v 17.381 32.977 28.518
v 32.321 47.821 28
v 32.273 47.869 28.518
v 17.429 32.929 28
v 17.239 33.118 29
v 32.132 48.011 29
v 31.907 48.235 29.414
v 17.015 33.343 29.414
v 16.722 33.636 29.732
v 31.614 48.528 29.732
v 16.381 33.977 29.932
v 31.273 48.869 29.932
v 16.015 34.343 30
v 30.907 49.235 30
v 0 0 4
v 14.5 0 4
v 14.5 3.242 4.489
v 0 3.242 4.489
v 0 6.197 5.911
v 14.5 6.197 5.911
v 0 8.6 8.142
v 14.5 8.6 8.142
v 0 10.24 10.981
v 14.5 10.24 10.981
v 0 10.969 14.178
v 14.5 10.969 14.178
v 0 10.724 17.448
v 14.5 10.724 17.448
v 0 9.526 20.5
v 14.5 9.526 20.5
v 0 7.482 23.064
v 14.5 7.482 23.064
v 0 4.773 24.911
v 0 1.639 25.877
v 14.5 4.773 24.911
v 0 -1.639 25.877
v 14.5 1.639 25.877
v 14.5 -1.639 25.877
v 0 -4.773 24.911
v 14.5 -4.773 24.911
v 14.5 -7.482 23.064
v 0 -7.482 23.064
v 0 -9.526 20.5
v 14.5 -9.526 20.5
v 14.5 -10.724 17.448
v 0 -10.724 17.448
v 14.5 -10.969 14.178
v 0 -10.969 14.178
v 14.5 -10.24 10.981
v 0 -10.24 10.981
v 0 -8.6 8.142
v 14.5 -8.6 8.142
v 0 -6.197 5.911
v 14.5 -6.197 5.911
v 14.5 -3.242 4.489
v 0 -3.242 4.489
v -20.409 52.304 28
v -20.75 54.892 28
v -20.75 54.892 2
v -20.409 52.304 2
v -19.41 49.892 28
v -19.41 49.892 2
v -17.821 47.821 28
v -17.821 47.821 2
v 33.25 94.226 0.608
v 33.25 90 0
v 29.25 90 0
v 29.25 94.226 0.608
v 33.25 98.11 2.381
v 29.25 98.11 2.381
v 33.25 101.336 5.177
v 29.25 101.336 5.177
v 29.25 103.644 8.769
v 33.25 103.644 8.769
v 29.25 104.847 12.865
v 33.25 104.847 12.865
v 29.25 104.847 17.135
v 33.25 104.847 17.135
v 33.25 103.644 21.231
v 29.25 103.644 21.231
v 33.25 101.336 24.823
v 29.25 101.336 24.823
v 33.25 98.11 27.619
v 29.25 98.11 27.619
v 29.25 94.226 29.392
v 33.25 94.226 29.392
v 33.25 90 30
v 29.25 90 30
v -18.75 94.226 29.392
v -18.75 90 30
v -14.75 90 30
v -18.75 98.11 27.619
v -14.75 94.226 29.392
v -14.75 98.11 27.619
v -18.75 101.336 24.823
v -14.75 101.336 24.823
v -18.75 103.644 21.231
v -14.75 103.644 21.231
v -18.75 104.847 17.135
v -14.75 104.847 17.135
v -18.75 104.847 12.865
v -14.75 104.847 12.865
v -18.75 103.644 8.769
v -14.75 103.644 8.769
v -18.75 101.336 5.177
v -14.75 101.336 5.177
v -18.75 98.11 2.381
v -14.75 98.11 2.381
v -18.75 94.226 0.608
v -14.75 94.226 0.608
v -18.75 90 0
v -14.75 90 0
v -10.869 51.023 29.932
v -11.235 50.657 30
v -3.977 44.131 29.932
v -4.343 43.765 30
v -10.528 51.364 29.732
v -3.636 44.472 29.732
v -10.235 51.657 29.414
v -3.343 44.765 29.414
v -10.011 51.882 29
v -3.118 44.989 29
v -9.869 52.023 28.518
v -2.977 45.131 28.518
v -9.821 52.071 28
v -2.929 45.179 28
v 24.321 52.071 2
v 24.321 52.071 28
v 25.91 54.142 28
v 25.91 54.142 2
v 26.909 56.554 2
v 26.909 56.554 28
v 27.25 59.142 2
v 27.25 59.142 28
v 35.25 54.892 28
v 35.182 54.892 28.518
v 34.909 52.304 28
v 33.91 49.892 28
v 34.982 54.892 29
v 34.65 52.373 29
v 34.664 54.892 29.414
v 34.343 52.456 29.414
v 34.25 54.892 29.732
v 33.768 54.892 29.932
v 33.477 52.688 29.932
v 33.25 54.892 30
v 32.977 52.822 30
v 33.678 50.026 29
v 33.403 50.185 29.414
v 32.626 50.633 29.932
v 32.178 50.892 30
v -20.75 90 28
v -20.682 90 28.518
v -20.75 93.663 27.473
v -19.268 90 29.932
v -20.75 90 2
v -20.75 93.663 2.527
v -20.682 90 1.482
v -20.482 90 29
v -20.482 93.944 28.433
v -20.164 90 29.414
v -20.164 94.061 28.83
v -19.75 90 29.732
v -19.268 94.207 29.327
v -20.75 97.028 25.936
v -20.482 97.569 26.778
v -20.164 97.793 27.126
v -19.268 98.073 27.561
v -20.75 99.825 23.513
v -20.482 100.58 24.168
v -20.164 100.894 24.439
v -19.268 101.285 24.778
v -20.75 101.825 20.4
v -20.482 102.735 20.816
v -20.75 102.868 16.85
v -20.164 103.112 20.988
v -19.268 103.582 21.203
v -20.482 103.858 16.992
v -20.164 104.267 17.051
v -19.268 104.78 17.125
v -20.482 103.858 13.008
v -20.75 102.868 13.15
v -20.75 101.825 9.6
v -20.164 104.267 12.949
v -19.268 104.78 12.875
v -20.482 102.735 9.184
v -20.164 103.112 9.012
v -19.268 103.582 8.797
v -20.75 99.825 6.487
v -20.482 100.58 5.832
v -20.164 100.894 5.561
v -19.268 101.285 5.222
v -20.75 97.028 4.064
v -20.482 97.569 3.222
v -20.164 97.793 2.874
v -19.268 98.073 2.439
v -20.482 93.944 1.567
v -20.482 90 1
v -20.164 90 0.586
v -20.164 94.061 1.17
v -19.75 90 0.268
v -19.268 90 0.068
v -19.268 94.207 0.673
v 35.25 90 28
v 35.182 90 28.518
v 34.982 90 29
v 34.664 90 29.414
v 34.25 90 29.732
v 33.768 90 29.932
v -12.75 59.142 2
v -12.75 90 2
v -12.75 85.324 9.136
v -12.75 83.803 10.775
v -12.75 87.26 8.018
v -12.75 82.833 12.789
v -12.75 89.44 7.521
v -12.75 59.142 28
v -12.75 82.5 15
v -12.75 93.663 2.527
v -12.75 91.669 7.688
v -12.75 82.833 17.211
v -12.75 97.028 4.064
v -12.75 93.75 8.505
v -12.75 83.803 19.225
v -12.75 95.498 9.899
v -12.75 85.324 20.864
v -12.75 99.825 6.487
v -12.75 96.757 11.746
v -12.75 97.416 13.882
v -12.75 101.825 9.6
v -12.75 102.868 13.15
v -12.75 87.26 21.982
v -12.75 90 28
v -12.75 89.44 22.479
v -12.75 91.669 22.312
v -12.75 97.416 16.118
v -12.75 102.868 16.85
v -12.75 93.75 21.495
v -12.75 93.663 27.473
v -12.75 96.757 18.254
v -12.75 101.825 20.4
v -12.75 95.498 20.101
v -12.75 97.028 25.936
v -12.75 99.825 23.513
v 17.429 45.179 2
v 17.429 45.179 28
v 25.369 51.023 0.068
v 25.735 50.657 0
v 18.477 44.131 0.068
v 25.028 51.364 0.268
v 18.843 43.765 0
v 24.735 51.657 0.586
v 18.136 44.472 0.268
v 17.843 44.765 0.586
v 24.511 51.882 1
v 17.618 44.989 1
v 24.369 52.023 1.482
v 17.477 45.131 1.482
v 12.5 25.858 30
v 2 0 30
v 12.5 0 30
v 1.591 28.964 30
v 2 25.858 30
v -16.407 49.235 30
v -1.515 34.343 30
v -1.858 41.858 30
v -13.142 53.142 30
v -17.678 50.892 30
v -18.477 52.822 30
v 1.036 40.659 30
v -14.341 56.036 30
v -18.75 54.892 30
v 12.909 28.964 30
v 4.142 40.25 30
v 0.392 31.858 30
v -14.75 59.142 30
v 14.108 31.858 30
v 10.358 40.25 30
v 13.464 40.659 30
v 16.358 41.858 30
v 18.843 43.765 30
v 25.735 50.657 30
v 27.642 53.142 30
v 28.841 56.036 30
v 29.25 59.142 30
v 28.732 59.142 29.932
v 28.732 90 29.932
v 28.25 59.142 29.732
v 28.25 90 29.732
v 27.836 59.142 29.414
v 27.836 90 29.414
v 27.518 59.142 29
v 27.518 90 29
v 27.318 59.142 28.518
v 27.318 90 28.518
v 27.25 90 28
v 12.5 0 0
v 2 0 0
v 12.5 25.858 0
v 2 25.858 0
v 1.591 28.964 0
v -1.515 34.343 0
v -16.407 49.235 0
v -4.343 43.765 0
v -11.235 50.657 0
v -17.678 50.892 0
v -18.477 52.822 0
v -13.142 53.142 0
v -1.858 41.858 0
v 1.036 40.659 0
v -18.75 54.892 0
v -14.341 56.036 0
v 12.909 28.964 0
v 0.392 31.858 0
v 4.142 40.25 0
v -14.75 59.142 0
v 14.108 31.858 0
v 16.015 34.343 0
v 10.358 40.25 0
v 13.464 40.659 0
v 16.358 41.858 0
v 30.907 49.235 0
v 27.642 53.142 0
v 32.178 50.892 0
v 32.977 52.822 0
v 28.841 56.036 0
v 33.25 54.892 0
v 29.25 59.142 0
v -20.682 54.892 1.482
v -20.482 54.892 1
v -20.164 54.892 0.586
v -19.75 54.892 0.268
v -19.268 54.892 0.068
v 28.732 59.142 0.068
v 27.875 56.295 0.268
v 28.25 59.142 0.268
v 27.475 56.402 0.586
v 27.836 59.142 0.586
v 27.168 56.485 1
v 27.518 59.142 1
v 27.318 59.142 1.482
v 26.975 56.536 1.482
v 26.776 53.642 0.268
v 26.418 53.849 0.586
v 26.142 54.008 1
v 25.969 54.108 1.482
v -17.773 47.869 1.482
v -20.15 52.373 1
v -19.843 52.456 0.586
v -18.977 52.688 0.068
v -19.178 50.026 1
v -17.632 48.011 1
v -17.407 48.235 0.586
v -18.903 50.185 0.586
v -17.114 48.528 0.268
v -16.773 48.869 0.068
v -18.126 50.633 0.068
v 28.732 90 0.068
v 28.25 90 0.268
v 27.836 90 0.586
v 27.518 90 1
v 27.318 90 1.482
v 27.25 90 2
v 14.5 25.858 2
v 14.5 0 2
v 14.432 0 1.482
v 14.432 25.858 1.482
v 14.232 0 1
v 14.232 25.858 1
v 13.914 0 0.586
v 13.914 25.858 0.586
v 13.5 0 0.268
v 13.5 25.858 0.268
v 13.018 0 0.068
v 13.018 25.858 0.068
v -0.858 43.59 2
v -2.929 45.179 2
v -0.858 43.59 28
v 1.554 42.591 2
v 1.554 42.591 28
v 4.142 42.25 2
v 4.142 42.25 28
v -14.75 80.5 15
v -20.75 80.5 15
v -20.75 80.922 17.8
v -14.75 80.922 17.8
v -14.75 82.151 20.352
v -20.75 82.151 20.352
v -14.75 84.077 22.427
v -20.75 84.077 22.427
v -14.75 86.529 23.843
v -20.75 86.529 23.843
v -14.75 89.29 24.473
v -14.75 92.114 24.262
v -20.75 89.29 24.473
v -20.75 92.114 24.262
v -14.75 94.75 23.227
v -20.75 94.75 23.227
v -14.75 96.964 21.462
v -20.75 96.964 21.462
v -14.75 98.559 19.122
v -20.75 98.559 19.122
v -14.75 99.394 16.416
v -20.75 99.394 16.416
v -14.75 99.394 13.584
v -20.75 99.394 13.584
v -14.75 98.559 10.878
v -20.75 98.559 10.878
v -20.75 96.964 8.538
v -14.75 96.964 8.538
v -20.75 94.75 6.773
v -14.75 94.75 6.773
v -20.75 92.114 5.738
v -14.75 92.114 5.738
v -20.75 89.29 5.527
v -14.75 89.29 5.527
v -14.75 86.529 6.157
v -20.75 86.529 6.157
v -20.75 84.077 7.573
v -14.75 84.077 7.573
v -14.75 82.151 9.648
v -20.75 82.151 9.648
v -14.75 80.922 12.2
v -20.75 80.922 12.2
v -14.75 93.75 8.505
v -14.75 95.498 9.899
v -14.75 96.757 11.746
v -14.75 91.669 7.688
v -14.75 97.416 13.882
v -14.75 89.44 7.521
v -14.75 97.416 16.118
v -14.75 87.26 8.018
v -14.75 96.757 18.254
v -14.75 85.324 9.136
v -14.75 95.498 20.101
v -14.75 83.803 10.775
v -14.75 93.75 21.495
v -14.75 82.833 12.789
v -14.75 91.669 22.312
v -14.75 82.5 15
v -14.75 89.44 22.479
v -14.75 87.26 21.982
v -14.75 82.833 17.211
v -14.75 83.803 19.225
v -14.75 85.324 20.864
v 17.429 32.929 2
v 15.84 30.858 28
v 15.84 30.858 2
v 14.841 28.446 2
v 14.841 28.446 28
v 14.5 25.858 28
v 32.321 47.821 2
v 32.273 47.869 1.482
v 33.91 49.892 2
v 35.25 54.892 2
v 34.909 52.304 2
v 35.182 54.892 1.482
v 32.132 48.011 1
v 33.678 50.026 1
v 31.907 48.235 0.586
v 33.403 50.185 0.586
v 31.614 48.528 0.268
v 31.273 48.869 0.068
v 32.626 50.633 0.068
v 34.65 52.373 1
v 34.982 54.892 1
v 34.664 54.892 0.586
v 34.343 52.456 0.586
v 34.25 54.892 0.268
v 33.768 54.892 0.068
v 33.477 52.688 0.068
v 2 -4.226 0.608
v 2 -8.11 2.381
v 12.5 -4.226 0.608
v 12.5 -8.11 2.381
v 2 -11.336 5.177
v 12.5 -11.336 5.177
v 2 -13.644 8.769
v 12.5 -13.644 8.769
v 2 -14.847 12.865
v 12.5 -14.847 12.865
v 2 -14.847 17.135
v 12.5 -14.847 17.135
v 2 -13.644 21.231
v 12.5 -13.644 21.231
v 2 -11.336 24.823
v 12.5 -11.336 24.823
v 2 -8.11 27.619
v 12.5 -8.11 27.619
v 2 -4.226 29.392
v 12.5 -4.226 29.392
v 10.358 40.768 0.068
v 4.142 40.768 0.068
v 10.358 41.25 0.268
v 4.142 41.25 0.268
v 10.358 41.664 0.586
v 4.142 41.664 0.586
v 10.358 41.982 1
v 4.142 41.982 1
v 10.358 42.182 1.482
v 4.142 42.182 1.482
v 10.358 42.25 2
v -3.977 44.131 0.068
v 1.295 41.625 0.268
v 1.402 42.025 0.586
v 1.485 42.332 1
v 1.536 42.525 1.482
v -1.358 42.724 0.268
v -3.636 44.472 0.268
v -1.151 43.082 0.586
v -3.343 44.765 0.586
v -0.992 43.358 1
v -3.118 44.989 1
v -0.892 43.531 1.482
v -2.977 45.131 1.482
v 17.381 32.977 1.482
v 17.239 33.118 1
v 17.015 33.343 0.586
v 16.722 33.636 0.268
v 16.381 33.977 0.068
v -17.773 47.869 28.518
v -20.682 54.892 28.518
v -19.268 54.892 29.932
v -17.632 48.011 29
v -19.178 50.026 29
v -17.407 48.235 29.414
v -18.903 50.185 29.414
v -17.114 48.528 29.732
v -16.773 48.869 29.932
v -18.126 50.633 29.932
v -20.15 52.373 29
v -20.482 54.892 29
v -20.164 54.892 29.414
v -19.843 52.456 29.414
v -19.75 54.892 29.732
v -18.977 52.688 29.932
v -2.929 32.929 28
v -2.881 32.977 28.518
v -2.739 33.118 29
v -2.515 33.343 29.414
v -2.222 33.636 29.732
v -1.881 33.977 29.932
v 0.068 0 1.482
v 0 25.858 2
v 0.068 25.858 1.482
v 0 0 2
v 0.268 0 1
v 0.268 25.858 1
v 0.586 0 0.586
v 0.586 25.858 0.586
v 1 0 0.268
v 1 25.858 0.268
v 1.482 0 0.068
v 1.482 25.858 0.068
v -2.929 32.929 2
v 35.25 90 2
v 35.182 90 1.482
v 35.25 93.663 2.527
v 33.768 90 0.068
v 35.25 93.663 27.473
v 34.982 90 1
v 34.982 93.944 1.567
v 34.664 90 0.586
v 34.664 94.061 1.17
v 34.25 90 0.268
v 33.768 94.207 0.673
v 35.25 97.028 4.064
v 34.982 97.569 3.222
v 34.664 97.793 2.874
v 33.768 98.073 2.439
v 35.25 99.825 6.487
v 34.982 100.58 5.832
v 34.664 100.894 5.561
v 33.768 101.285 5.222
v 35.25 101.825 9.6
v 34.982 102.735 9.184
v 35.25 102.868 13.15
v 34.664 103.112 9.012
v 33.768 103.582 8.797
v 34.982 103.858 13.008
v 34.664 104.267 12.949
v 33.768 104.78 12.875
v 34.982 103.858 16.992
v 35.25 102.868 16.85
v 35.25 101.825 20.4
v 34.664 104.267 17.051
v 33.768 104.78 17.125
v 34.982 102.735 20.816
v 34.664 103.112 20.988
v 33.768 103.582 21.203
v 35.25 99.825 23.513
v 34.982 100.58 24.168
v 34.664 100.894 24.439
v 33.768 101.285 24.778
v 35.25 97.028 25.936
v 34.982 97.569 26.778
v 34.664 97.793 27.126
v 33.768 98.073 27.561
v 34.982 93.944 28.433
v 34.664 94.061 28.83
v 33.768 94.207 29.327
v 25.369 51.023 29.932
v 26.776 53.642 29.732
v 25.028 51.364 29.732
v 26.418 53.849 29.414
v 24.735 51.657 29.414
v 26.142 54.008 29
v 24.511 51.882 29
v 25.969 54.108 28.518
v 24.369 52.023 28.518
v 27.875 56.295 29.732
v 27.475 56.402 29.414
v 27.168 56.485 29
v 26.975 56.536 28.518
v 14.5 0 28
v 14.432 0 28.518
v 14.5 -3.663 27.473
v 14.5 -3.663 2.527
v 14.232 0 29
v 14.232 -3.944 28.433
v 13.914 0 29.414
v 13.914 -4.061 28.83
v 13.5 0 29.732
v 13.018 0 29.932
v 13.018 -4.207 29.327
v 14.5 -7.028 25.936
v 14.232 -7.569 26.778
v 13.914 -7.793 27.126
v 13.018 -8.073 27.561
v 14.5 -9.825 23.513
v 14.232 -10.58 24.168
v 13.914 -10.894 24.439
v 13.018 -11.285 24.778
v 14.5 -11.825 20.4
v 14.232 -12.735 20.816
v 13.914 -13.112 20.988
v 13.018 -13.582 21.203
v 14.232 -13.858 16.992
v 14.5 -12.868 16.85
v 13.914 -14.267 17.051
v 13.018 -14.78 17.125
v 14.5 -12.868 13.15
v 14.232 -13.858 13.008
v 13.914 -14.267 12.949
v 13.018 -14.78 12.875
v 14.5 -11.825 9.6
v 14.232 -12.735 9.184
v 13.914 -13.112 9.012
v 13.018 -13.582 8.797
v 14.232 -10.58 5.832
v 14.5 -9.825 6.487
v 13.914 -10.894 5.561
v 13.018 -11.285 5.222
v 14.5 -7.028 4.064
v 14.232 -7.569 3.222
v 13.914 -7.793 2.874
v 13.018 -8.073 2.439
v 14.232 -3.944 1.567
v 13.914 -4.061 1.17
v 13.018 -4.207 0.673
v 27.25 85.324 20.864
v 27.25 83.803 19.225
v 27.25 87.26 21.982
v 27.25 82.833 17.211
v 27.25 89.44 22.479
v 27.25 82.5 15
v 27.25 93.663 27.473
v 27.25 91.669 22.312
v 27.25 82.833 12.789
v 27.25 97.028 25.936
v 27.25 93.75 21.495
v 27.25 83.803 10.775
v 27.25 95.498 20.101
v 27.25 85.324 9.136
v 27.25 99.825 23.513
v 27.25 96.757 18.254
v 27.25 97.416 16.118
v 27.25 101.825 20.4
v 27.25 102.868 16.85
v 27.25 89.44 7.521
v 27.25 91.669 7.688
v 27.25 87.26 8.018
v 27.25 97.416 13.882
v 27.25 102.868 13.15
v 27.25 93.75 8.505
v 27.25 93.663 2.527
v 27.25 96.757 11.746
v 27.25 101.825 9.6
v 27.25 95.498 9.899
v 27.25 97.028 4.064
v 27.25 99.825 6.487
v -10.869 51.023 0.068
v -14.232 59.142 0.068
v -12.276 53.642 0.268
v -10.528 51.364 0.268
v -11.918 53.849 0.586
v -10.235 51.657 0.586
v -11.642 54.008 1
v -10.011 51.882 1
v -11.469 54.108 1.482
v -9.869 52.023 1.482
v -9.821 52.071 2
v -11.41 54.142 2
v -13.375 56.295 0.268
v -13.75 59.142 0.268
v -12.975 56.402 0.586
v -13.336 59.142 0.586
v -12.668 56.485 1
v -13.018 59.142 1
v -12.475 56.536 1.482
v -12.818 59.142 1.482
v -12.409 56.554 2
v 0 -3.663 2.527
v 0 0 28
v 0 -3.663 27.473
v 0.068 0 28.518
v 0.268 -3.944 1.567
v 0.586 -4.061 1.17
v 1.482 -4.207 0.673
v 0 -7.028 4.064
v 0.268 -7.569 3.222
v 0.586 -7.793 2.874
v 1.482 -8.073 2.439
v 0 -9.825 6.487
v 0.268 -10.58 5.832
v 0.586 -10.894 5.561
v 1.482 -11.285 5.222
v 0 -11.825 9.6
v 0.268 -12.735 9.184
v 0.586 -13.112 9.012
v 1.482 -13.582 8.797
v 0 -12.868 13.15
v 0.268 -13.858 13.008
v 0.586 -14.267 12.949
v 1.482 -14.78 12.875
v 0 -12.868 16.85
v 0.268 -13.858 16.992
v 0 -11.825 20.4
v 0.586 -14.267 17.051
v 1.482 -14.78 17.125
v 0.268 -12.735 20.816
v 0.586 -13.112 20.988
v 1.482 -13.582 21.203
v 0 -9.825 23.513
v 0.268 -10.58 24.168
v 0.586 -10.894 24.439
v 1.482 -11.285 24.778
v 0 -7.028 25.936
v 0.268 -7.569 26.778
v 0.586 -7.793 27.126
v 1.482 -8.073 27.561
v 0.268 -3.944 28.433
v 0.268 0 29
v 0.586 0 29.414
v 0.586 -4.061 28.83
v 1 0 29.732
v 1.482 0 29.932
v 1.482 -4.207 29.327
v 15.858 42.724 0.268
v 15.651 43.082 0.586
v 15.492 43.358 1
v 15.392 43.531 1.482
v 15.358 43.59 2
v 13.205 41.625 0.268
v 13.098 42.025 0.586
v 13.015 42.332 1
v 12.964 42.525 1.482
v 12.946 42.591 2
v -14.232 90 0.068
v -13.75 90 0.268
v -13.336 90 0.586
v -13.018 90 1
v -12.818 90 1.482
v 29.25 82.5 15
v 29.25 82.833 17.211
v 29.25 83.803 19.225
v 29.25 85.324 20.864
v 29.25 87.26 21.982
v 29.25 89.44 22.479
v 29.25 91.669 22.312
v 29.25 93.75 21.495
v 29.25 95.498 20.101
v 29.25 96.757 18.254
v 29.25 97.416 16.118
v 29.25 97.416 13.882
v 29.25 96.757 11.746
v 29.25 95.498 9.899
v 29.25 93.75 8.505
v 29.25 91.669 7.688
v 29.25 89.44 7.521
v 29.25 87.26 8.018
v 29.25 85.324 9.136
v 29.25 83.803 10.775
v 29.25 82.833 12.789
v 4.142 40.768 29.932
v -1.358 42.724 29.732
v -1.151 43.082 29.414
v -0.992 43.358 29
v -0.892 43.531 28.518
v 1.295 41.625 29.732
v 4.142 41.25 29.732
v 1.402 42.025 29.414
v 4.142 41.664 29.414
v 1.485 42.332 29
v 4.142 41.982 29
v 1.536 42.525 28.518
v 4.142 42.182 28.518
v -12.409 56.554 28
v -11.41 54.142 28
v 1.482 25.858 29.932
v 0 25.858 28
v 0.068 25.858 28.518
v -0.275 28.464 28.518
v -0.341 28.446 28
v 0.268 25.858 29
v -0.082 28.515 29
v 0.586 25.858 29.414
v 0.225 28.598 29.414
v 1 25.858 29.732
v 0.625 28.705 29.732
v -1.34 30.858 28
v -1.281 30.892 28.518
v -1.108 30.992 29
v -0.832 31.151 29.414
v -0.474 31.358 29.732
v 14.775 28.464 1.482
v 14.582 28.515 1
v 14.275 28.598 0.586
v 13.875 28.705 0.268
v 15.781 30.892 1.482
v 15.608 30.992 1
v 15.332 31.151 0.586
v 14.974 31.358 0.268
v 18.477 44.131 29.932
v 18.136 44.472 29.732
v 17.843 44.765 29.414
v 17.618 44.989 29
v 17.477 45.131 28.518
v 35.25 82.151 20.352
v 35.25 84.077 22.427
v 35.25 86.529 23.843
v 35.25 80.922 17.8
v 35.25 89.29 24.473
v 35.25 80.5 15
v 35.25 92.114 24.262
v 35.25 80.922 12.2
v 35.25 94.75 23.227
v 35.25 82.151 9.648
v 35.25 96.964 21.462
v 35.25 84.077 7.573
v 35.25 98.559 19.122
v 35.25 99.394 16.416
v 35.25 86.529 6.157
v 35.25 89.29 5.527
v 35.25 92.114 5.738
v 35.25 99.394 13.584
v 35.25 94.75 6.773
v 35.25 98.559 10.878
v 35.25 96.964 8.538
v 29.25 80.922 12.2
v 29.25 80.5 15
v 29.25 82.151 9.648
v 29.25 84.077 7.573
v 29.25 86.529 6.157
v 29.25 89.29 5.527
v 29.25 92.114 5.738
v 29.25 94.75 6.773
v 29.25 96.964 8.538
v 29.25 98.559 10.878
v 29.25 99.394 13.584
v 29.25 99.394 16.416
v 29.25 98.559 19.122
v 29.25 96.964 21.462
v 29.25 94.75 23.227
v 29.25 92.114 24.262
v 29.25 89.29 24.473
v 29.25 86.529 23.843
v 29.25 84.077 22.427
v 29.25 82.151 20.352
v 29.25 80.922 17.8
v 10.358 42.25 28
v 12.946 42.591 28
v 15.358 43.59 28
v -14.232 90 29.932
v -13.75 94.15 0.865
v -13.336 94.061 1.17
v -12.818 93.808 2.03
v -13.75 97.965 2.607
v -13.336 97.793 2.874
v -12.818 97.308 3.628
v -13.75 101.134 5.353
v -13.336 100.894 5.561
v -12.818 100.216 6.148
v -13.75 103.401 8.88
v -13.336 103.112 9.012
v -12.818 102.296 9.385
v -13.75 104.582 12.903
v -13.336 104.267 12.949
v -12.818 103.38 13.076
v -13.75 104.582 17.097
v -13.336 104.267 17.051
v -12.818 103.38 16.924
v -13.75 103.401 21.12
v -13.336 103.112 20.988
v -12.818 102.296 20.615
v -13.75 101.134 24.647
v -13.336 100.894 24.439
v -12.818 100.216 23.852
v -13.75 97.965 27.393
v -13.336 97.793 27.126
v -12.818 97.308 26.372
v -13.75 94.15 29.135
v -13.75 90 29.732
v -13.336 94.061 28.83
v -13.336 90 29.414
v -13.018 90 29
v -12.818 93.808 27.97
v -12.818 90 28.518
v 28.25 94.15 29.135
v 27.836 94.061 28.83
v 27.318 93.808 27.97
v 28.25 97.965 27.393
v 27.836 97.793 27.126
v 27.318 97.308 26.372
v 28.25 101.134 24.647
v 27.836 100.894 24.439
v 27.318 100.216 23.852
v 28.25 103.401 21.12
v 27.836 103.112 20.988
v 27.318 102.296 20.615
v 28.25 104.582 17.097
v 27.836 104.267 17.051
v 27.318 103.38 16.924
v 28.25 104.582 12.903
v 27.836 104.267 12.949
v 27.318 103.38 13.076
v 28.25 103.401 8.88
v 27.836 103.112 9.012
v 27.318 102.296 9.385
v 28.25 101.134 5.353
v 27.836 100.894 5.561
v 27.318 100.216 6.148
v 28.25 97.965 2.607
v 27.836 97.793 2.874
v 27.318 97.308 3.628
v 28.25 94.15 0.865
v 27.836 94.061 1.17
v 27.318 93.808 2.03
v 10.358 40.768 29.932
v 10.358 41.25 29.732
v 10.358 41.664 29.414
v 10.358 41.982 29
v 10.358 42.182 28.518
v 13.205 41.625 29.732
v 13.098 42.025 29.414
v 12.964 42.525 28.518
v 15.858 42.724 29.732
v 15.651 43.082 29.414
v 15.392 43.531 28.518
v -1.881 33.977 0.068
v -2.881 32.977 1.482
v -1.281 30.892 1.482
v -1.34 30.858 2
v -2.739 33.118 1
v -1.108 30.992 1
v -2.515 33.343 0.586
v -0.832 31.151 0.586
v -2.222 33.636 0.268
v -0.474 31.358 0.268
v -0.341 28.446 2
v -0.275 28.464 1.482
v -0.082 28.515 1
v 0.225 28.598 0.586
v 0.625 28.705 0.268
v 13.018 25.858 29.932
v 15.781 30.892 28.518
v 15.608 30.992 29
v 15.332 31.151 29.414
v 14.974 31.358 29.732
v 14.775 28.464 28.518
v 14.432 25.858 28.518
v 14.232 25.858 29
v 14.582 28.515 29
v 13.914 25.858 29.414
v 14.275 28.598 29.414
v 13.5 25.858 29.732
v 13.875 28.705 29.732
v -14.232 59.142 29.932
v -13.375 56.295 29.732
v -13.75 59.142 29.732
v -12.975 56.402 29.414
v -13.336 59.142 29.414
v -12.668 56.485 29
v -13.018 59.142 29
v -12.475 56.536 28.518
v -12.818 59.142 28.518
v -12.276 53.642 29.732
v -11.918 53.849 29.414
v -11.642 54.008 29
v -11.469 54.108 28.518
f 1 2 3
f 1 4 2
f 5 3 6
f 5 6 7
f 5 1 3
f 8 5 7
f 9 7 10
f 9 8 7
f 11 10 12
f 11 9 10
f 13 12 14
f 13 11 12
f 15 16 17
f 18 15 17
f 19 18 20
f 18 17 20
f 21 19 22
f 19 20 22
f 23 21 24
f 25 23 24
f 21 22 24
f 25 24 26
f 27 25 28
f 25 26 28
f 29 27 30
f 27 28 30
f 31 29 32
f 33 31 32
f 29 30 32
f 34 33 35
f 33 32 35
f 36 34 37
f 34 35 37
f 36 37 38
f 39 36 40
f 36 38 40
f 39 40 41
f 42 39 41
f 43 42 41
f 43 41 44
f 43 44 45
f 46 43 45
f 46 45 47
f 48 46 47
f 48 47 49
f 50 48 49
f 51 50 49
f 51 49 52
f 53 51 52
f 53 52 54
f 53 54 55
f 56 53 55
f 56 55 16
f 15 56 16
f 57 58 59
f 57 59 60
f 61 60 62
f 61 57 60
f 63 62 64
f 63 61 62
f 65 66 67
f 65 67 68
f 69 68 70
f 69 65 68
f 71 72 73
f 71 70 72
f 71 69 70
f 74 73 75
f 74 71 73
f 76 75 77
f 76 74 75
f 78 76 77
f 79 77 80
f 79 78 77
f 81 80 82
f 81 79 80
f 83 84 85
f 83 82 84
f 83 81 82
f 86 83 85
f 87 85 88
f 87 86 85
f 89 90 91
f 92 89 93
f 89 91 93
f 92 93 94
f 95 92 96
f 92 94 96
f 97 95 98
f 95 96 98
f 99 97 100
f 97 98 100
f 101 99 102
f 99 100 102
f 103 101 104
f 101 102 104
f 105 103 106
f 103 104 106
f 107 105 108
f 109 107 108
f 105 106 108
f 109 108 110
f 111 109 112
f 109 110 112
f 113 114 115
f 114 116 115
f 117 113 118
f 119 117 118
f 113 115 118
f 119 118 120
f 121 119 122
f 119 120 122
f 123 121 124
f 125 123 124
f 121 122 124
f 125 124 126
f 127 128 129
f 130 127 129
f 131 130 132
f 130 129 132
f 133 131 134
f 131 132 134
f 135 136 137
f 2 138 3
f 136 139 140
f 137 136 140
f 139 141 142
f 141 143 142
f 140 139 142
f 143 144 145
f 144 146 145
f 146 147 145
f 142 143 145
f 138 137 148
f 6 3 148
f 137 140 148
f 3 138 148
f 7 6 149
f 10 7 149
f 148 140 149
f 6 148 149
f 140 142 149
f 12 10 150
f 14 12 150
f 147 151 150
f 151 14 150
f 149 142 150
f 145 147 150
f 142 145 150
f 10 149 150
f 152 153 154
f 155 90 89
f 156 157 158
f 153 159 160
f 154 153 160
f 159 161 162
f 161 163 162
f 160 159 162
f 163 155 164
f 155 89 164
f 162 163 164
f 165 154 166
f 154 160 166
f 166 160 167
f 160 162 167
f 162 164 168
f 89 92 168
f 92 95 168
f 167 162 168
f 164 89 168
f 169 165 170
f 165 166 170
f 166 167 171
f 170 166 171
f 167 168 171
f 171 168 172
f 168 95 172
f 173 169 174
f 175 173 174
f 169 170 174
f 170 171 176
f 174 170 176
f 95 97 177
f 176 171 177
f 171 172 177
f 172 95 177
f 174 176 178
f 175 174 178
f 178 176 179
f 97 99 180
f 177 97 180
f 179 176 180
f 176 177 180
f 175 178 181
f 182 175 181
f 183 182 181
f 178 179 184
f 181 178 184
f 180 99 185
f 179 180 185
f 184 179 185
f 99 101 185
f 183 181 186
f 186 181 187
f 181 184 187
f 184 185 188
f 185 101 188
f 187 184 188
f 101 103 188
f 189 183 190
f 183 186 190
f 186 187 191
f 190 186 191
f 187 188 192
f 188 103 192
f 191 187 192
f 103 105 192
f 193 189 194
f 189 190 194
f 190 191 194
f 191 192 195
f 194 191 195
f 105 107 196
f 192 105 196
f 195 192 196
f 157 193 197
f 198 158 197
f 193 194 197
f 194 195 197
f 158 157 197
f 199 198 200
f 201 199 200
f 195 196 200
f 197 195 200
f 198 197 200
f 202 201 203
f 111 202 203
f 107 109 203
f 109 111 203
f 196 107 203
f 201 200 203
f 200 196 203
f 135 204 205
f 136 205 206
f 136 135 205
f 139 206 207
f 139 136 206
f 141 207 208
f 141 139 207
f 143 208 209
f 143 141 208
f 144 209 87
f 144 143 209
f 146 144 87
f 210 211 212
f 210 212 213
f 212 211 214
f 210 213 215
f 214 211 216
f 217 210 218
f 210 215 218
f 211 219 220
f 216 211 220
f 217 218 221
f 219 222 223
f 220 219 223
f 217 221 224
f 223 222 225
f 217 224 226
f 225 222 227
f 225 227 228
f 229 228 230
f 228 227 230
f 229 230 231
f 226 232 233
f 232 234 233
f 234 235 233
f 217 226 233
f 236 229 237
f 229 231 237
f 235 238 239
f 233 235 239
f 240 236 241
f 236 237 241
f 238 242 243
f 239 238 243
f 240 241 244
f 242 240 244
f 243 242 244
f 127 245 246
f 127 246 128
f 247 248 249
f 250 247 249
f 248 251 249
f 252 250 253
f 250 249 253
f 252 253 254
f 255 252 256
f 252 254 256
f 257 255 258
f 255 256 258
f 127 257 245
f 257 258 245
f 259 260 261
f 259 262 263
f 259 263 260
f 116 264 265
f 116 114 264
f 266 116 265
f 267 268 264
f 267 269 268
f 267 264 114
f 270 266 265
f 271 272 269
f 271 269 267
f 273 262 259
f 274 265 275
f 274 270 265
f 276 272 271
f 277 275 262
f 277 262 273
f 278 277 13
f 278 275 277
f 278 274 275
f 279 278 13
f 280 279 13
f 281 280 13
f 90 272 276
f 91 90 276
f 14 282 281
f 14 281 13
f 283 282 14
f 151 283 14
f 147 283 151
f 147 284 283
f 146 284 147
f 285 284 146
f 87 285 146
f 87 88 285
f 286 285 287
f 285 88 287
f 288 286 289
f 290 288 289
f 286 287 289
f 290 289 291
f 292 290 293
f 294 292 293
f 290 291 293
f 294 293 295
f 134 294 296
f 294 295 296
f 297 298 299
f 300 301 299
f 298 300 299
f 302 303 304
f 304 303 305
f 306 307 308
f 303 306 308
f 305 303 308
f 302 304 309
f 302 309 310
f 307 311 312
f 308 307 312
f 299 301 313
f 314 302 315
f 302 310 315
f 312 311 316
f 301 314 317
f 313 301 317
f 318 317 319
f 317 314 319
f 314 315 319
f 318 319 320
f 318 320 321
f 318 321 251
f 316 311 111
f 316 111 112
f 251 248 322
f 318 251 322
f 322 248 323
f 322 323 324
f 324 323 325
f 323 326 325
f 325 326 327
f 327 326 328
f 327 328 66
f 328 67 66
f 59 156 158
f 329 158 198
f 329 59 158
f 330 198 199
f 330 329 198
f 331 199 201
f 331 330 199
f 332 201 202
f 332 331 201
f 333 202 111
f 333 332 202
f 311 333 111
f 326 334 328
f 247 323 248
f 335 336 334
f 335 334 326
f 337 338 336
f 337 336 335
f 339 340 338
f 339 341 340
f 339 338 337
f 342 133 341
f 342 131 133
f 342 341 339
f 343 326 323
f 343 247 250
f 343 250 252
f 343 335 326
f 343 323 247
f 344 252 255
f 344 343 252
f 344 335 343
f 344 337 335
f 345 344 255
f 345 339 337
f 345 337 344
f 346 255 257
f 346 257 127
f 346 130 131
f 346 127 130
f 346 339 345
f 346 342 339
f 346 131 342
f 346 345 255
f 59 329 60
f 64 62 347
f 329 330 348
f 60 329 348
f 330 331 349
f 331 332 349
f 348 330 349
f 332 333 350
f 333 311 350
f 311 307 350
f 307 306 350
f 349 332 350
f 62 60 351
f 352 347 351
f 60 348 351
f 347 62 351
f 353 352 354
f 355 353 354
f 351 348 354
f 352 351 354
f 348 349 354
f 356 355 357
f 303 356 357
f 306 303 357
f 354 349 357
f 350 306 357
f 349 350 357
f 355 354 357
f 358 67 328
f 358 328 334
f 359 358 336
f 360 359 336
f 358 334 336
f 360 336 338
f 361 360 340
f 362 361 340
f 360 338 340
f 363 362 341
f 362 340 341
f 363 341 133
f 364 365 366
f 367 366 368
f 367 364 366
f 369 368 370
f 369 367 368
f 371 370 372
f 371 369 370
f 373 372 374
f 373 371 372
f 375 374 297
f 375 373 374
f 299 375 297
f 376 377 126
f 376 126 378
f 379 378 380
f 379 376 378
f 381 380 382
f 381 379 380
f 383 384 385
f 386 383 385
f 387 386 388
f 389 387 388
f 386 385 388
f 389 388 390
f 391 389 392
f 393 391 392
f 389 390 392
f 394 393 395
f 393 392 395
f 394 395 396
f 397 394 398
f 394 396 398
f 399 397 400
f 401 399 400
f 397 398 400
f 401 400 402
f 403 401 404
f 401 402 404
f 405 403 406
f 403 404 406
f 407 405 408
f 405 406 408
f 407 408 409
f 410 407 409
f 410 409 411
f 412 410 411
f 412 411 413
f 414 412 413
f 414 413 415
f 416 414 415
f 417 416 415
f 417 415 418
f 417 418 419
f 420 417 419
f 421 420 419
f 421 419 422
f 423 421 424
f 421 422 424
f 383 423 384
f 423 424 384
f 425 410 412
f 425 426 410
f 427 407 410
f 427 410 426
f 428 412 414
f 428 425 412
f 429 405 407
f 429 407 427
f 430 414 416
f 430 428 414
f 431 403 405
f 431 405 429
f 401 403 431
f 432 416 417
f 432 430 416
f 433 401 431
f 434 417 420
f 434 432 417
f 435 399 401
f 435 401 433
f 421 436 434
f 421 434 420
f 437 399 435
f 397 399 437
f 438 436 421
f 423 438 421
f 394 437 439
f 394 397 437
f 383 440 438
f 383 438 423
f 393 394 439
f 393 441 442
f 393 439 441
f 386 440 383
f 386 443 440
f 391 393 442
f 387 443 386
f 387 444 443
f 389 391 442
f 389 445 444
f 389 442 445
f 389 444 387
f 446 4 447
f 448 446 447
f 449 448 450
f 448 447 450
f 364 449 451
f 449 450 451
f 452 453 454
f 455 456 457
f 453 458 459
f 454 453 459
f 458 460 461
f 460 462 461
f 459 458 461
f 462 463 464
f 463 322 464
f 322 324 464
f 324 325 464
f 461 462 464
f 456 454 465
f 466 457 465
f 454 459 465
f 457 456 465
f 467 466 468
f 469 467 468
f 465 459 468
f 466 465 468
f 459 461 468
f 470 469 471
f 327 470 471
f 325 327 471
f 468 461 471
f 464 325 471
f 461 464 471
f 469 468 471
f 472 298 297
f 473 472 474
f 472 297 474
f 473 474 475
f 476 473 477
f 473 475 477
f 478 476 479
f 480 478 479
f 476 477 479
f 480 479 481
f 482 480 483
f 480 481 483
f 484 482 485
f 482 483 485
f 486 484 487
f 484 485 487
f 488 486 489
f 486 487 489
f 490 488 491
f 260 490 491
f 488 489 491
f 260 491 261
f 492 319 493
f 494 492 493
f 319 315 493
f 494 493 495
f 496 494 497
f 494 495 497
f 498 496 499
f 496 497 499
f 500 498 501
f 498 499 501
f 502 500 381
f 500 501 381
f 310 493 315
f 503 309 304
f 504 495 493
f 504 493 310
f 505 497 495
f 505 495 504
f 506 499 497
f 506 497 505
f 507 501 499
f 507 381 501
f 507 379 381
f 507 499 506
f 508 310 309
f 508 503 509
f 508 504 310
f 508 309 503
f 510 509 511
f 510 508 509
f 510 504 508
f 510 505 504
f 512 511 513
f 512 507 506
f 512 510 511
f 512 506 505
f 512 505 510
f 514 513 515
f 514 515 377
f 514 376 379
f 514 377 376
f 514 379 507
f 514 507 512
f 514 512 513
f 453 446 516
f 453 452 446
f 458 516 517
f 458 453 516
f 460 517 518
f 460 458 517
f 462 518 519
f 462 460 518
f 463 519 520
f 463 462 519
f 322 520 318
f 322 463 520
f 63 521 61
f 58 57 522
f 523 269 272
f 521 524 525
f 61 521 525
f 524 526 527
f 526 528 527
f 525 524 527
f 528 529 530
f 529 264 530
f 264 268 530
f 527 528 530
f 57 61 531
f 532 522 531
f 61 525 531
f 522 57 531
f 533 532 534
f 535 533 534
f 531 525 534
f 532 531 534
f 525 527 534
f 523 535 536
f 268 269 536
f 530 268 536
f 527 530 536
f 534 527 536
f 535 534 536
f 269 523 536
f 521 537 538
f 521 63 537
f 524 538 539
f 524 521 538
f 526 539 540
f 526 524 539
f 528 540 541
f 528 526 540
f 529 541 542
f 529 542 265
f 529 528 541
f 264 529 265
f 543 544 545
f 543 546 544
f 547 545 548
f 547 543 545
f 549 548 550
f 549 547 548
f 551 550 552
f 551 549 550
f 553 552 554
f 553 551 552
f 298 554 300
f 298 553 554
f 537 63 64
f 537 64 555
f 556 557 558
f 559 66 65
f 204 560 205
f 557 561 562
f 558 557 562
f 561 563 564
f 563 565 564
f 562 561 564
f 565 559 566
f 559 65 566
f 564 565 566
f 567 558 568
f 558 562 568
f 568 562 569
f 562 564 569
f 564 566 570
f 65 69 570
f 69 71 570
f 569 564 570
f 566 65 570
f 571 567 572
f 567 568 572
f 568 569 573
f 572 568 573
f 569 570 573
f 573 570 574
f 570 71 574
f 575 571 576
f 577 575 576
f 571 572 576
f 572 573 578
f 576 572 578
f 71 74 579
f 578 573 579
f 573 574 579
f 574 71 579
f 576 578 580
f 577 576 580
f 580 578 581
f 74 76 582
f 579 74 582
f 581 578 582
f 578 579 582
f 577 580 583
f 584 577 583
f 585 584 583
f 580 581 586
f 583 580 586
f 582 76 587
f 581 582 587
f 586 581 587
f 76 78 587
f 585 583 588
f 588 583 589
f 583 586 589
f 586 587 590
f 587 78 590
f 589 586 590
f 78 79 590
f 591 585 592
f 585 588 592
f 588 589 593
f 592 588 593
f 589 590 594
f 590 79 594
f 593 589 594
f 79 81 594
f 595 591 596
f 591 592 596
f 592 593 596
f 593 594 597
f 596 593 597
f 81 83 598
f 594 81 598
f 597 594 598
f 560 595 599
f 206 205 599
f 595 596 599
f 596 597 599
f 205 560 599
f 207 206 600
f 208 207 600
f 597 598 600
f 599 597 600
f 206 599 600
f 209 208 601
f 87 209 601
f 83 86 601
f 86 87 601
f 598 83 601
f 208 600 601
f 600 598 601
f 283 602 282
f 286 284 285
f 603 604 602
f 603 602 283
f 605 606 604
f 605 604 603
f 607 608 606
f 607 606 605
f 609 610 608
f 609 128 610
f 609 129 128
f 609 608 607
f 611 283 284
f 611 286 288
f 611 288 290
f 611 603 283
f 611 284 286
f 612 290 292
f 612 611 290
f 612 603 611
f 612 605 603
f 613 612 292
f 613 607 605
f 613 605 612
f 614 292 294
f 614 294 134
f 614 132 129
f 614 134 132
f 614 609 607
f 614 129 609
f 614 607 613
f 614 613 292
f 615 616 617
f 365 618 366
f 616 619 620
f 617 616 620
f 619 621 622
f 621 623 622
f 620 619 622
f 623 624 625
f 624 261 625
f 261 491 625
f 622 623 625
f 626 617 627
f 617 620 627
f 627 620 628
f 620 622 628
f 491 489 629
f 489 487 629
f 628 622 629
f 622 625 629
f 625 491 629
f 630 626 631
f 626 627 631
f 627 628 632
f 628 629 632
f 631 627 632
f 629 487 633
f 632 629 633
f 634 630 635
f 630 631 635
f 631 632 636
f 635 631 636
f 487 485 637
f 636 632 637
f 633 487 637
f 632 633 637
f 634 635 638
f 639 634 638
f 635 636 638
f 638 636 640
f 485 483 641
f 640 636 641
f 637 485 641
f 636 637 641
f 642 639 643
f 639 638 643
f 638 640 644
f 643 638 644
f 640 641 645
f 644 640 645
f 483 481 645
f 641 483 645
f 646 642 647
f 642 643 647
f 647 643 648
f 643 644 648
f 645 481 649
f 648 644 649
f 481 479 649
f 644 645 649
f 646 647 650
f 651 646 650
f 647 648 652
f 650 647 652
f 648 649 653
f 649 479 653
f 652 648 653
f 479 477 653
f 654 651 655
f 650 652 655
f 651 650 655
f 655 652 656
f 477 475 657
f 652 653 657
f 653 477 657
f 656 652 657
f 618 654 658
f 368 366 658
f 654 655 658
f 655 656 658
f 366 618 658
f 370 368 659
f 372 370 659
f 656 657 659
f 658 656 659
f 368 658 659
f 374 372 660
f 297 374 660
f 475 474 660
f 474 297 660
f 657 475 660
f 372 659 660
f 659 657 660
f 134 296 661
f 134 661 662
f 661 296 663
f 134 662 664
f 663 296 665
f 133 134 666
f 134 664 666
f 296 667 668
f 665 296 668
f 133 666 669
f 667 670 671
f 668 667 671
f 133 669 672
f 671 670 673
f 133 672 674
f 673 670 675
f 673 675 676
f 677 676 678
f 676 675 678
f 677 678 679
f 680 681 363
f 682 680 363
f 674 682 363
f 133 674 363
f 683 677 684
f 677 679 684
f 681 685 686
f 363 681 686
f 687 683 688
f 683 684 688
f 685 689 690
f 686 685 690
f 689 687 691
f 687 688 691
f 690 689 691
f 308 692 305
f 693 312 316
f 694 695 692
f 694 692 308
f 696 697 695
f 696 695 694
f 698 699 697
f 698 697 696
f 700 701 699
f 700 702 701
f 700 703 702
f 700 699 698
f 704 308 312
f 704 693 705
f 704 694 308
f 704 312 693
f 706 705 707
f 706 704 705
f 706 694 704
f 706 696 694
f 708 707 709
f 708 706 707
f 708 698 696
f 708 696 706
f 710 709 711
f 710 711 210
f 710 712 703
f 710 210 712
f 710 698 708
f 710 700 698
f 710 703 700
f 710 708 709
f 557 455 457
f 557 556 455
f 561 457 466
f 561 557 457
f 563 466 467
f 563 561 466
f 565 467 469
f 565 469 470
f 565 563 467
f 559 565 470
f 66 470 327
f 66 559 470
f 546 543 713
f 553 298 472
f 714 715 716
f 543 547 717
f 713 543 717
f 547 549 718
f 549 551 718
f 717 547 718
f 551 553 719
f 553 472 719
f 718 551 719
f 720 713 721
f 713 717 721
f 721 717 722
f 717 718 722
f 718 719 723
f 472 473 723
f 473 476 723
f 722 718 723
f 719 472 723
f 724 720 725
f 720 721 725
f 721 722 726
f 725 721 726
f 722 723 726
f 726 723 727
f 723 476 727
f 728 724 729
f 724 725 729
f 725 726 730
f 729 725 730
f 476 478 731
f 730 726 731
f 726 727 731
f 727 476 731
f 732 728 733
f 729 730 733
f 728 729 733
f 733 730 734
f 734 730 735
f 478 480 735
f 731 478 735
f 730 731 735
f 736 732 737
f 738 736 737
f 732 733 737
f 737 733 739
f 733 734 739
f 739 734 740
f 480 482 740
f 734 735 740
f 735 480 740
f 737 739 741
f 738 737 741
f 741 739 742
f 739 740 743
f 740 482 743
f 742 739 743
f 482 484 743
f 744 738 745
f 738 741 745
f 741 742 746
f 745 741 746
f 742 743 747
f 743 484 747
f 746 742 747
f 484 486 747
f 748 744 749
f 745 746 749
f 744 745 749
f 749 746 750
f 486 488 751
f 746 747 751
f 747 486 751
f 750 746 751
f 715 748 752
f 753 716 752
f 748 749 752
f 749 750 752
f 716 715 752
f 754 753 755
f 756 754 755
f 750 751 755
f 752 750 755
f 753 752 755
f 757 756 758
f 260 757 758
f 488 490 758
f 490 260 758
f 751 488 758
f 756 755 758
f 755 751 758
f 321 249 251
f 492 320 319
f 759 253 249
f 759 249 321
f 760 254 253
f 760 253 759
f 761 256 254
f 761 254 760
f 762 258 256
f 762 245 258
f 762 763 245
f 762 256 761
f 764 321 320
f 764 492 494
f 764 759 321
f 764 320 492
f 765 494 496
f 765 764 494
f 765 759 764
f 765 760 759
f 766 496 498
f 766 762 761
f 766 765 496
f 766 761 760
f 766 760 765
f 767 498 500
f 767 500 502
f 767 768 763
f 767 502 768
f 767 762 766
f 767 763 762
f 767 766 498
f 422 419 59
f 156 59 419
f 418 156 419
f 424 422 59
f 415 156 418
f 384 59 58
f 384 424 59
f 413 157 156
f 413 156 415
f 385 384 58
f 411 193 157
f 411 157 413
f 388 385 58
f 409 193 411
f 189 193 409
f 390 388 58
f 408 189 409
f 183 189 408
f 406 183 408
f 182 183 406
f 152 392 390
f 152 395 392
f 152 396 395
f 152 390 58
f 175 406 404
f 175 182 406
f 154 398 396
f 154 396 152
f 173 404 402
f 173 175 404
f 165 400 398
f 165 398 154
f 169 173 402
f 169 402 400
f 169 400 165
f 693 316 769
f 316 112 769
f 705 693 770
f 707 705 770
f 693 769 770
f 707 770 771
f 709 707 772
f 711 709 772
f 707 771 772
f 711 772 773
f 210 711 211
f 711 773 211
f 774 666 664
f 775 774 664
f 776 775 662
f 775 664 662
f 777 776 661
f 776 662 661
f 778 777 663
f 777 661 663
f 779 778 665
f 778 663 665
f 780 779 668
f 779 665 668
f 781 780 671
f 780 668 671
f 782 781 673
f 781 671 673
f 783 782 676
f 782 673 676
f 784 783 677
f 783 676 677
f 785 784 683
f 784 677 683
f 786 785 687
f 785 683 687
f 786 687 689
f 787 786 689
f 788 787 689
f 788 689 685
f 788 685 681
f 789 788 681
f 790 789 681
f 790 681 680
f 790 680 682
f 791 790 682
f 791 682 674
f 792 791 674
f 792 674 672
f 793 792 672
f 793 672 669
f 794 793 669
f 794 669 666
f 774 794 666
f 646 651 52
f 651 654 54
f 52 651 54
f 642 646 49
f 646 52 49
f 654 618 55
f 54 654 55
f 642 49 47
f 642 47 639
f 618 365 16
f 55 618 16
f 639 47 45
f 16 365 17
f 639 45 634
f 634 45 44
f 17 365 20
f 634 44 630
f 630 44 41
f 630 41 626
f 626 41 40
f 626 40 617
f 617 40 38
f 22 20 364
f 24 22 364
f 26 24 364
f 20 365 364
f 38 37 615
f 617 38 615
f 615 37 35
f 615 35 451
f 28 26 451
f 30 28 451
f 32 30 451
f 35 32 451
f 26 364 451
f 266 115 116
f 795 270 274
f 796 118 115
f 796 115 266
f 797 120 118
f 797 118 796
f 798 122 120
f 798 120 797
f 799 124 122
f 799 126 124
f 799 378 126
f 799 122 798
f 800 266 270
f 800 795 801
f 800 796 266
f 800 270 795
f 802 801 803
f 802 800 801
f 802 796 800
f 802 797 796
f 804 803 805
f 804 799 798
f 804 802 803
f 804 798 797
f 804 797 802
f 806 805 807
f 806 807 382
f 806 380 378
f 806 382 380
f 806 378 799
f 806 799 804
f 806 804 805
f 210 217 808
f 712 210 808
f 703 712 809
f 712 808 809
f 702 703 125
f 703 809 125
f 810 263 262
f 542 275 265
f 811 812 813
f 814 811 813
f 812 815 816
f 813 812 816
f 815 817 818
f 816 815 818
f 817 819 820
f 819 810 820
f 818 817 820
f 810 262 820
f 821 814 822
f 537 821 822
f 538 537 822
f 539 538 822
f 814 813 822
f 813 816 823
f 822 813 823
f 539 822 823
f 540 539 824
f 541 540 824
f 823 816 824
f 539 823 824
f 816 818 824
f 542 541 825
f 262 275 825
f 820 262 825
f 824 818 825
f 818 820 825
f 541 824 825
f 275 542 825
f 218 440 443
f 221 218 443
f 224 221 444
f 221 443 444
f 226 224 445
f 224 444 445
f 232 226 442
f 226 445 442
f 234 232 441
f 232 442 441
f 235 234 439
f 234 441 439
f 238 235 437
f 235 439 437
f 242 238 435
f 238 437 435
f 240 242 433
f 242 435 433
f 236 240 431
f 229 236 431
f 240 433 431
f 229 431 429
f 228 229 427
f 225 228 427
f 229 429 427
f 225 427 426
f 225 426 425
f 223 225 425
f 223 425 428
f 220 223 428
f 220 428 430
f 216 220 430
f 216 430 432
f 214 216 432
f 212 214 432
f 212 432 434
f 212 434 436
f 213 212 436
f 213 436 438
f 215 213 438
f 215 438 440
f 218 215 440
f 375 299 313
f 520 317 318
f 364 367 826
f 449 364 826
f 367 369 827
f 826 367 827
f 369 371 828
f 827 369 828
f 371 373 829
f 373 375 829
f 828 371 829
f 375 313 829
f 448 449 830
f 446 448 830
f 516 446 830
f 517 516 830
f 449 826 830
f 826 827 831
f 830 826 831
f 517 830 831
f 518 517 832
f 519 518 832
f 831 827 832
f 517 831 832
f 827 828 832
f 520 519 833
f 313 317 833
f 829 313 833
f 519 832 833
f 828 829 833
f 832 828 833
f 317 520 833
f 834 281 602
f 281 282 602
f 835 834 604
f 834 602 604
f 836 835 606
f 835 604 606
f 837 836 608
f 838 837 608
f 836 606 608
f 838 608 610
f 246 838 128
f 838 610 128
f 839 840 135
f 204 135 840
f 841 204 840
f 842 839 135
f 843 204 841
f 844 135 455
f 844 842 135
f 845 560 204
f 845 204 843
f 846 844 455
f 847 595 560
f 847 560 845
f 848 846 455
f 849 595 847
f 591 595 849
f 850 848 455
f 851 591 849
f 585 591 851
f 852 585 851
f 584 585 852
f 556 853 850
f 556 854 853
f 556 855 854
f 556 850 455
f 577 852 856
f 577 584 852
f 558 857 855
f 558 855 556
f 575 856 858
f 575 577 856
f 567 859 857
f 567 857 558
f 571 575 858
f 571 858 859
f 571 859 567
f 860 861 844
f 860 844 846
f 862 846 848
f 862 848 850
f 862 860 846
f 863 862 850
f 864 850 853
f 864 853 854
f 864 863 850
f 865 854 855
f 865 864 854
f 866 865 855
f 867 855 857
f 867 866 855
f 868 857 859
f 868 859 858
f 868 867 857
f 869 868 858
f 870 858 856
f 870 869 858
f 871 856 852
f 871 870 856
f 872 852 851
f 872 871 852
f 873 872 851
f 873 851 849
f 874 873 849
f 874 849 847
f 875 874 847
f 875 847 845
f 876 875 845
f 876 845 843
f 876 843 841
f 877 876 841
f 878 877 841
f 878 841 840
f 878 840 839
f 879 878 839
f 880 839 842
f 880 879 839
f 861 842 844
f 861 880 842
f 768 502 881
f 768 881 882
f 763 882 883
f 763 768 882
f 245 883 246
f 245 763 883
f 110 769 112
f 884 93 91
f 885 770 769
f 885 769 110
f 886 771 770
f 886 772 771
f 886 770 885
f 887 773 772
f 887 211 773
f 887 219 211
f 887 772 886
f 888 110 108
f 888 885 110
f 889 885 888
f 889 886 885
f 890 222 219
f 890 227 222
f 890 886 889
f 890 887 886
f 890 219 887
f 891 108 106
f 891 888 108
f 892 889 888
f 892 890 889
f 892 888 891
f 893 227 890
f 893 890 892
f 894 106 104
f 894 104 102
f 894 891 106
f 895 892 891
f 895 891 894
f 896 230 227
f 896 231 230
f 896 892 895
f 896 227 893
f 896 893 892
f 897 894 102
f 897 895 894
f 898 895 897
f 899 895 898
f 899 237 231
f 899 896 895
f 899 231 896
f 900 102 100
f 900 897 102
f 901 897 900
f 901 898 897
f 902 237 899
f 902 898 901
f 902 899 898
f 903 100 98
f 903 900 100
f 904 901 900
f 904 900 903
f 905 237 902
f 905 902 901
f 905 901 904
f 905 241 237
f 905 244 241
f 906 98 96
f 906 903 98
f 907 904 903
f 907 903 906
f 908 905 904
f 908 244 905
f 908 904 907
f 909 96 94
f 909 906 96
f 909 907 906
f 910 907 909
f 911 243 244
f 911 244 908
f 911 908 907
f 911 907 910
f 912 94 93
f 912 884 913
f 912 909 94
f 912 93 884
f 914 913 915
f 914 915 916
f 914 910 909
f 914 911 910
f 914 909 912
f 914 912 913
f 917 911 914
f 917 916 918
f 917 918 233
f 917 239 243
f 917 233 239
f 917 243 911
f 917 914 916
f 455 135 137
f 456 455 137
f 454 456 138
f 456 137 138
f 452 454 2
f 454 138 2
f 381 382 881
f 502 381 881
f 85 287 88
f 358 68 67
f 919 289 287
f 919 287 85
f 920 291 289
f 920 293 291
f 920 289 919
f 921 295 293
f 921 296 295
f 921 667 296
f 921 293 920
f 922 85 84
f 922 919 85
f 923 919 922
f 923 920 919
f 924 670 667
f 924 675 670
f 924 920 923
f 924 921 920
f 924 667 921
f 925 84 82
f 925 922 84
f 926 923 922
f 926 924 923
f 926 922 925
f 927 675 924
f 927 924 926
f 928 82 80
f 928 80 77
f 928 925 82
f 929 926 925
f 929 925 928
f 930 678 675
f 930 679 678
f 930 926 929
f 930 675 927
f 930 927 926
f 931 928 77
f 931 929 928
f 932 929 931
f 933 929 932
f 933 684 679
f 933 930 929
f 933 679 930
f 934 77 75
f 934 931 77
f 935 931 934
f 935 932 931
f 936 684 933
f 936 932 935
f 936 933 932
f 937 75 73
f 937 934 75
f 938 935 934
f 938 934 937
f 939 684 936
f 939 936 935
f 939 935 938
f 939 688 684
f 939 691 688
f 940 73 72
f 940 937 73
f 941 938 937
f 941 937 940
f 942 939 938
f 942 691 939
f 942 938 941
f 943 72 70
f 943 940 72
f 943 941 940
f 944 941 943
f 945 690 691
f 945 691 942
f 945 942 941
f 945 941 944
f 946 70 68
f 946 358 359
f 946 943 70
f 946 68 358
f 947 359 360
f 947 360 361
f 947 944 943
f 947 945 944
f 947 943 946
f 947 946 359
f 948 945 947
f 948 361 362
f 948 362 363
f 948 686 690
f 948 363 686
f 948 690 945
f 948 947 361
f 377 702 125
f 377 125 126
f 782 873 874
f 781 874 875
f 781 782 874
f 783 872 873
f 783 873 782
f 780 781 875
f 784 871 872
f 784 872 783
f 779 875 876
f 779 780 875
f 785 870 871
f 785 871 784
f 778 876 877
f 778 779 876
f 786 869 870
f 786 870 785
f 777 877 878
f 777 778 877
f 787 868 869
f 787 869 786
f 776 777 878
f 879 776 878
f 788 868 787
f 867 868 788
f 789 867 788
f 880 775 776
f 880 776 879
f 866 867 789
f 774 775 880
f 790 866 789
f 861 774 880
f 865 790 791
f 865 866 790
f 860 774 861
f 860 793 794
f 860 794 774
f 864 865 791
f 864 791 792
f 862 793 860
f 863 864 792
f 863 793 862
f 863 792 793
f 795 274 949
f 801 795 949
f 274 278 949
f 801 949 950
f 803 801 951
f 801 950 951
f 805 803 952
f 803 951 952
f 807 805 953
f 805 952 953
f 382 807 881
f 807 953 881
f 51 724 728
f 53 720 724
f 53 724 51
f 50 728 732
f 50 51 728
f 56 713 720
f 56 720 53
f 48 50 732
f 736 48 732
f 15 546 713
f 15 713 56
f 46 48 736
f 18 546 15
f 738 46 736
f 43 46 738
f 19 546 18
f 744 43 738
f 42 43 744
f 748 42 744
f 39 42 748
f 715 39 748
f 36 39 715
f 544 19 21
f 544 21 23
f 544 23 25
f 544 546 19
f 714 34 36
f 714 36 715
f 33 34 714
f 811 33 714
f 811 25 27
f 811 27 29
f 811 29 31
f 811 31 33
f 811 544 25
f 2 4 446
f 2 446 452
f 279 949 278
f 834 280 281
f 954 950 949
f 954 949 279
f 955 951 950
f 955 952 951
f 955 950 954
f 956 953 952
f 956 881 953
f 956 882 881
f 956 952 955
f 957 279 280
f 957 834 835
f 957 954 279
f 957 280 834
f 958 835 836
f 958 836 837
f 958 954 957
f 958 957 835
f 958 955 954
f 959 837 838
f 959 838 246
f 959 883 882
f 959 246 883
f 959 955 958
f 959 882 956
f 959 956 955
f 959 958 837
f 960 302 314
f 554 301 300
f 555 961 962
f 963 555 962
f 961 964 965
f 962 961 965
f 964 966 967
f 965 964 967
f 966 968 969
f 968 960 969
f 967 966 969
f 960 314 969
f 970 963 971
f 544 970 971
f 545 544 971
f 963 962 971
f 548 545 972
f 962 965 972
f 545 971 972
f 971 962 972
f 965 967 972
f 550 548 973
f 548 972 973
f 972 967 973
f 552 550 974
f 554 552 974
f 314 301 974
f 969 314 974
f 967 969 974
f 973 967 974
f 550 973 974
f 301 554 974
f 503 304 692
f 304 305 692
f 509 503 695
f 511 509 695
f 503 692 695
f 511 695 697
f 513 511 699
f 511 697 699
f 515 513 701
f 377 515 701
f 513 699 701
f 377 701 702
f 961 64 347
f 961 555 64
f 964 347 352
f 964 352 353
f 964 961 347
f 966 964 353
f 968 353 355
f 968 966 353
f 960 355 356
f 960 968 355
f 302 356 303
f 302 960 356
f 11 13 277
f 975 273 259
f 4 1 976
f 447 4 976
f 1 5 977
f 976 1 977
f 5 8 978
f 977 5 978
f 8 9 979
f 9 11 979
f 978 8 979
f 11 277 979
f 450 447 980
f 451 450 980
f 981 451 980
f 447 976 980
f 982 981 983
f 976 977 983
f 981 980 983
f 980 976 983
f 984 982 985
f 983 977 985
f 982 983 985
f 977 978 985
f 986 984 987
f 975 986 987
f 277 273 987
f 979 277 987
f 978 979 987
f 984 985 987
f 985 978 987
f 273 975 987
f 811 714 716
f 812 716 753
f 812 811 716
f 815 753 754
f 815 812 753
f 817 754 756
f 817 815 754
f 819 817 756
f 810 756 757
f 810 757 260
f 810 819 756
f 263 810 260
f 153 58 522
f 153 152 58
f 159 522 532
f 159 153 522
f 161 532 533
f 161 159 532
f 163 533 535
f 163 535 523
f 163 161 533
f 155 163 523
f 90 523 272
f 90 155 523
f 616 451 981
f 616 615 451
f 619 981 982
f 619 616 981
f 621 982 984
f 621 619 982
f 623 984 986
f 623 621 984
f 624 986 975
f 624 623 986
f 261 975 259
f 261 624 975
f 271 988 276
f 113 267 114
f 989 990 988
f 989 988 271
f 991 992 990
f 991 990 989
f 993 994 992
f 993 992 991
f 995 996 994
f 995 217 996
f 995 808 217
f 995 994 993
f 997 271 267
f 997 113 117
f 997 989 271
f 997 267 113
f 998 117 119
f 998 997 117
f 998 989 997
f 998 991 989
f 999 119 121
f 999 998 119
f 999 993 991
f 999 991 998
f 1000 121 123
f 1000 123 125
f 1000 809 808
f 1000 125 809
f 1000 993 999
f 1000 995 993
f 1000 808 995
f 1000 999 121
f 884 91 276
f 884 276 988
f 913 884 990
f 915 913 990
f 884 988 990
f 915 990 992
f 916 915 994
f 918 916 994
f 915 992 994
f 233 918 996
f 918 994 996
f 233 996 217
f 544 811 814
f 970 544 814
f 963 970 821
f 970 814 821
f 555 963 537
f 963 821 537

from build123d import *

# Parameters (mm, degrees)
EXTRUDE_1_DEPTH     = 30
CUT_EXTRUDE_1_DEPTH = 102.205545797
EXTRUDE_2_DEPTH     = 14.5
SKETCH_4_R          = 11
CUT_EXTRUDE_2_DEPTH = 20
EXTRUDE_3_DEPTH     = 8
EXTRUDE_START       = -8
EXTRUDE_4_DEPTH     = 8
SKETCH_9_R          = 7.5
CUT_EXTRUDE_5_DEPTH = 62
SKETCH_10_R         = 9.5
CUT_EXTRUDE_6_DEPTH = 6
CUT_EXTRUDE_START   = -6
SKETCH_11_R         = 9.5
CUT_EXTRUDE_7_DEPTH = 6
FILLET_1_R          = 10
FILLET_2_R          = 2


with BuildPart() as part:
    # 草图1 → 凸台-拉伸1 (new body)
    with BuildSketch(Plane.XY):
        Polygon((0, 0), (14.5, 0), (14.5, 30), (35.25, 50.75), (35.25, 90), (27.25, 90), (27.25, 55), (-12.75, 55), (-12.75, 90), (-20.75, 90), (-20.75, 50.75), (0, 30), align=None)
    extrude(amount=EXTRUDE_1_DEPTH)

    # 草图2 → 切除-拉伸1 (cut, through all)
    with BuildSketch(Plane.XY.offset(30)):
        Polygon((-12.75, 55), (0, 42.25), (14.5, 42.25), (27.25, 55), align=None)
    extrude(amount=-CUT_EXTRUDE_1_DEPTH, mode=Mode.SUBTRACT)

    # 草图3 → 凸台-拉伸2 (add)
    with BuildSketch(Plane(origin=(14.5, 0, 0), x_dir=(0, 0, -1), z_dir=(1, 0, 0))):
        with BuildLine():
            Line((-30, 0), (0, 0))
            ThreePointArc((0, 0), (-15, -15), (-30, 0))
        make_face()
    extrude(amount=-EXTRUDE_2_DEPTH)

    # 草图4 → 切除-拉伸2 (cut)
    with BuildSketch(Plane(origin=(14.5, 0, 0), x_dir=(0, 0, -1), z_dir=(1, 0, 0))):
        with Locations((-15, 0)):
            Circle(SKETCH_4_R)
    extrude(amount=-CUT_EXTRUDE_2_DEPTH, mode=Mode.SUBTRACT)

    # 草图7 → 凸台-拉伸3 (add)
    with BuildSketch(Plane(origin=(35.25, 0, 0), x_dir=(0, 0, -1), z_dir=(1, 0, 0))):
        with BuildLine():
            Line((-30, 90), (0, 90))
            ThreePointArc((0, 90), (-15, 105), (-30, 90))
        make_face()
    extrude(amount=-EXTRUDE_3_DEPTH)

    # 草图8 → 凸台-拉伸4 (add)
    with BuildSketch(Plane.ZY.offset(20.75).offset(EXTRUDE_START)):
        with BuildLine():
            Line((0, 90), (30, 90))
            ThreePointArc((30, 90), (15, 105), (0, 90))
        make_face()
    extrude(amount=EXTRUDE_4_DEPTH)

    # 草图9 → 切除-拉伸5 (cut)
    with BuildSketch(Plane.ZY.offset(20.75)):
        with Locations(Location((15, 90, 0), (0, 0, 270))):
            Circle(SKETCH_9_R)
    extrude(amount=-CUT_EXTRUDE_5_DEPTH, mode=Mode.SUBTRACT)

    # 草图10 → 切除-拉伸6 (cut)
    with BuildSketch(Plane.ZY.offset(20.75)):
        with Locations(Location((15, 90, 0), (0, 0, 270))):
            Circle(SKETCH_10_R)
    extrude(amount=-CUT_EXTRUDE_6_DEPTH, mode=Mode.SUBTRACT)

    # 草图11 → 切除-拉伸7 (cut)
    with BuildSketch(Plane(origin=(35.25, 0, 0), x_dir=(0, 0, -1), z_dir=(1, 0, 0)).offset(CUT_EXTRUDE_START)):
        with Locations(Location((-15, 90, 0), (0, 0, 270))):
            Circle(SKETCH_11_R)
    extrude(amount=CUT_EXTRUDE_7_DEPTH, mode=Mode.SUBTRACT)

    # 圆角1
    fillet_1_edges = [part.edges().sort_by_distance(p)[0] for p in [
        (0, 30, 15),
        (-20.75, 50.75, 15),
        (-12.75, 55, 15),
        (27.25, 55, 15),
        (35.25, 50.75, 15),
        (14.5, 30, 15),
        (14.5, 42.25, 15),
        (0, 42.25, 15),
    ]]
    fillet(fillet_1_edges, radius=FILLET_1_R)

    # 圆角2
    fillet_2_edges = [part.edges().sort_by_distance(p)[0] for p in [
        (20.875, 48.625, 30),
        (20.875, 48.625, 0),
        (7.25, 42.25, 30),
        (7.25, 42.25, 0),
        (-6.375, 48.625, 30),
        (-6.375, 48.625, 0),
        (-12.75, 74.571067812, 0),
        (-12.75, 74.571067812, 30),
        (-10.375, 40.375, 0),
        (-10.375, 40.375, 30),
        (35.25, 72.446067812, 0),
        (24.875, 40.375, 0),
        (0, 12.928932188, 0),
        (34.488795325, 51.0653013, 0),
        (-19.988795325, 51.0653013, 0),
        (0, 12.928932188, 30),
        (24.875, 40.375, 30),
        (35.25, 72.446067812, 30),
        (34.488795325, 51.0653013, 30),
        (-19.988795325, 51.0653013, 30),
        (-20.75, 72.446067812, 0),
        (26.488795325, 55.3153013, 0),
        (26.488795325, 55.3153013, 30),
        (14.1846987, 43.011204675, 30),
        (14.1846987, 43.011204675, 0),
        (0.3153013, 43.011204675, 30),
        (0.3153013, 43.011204675, 0),
        (14.5, 12.928932188, 30),
        (-11.988795325, 55.3153013, 0),
        (-11.988795325, 55.3153013, 30),
        (-0.761204675, 29.6846987, 0),
        (-0.761204675, 29.6846987, 30),
        (15.261204675, 29.6846987, 0),
        (15.261204675, 29.6846987, 30),
        (27.25, 74.571067812, 0),
        (14.5, 12.928932188, 0),
        (27.25, 74.571067812, 30),
        (-20.75, 72.446067812, 30),
        (14.5, -15, 15),
        (0, -15, 15),
        (35.25, 105, 15),
        (27.25, 105, 15),
        (-20.75, 105, 15),
        (-12.75, 105, 15),
    ]]
    fillet(fillet_2_edges, radius=FILLET_2_R)


solid = part.part
